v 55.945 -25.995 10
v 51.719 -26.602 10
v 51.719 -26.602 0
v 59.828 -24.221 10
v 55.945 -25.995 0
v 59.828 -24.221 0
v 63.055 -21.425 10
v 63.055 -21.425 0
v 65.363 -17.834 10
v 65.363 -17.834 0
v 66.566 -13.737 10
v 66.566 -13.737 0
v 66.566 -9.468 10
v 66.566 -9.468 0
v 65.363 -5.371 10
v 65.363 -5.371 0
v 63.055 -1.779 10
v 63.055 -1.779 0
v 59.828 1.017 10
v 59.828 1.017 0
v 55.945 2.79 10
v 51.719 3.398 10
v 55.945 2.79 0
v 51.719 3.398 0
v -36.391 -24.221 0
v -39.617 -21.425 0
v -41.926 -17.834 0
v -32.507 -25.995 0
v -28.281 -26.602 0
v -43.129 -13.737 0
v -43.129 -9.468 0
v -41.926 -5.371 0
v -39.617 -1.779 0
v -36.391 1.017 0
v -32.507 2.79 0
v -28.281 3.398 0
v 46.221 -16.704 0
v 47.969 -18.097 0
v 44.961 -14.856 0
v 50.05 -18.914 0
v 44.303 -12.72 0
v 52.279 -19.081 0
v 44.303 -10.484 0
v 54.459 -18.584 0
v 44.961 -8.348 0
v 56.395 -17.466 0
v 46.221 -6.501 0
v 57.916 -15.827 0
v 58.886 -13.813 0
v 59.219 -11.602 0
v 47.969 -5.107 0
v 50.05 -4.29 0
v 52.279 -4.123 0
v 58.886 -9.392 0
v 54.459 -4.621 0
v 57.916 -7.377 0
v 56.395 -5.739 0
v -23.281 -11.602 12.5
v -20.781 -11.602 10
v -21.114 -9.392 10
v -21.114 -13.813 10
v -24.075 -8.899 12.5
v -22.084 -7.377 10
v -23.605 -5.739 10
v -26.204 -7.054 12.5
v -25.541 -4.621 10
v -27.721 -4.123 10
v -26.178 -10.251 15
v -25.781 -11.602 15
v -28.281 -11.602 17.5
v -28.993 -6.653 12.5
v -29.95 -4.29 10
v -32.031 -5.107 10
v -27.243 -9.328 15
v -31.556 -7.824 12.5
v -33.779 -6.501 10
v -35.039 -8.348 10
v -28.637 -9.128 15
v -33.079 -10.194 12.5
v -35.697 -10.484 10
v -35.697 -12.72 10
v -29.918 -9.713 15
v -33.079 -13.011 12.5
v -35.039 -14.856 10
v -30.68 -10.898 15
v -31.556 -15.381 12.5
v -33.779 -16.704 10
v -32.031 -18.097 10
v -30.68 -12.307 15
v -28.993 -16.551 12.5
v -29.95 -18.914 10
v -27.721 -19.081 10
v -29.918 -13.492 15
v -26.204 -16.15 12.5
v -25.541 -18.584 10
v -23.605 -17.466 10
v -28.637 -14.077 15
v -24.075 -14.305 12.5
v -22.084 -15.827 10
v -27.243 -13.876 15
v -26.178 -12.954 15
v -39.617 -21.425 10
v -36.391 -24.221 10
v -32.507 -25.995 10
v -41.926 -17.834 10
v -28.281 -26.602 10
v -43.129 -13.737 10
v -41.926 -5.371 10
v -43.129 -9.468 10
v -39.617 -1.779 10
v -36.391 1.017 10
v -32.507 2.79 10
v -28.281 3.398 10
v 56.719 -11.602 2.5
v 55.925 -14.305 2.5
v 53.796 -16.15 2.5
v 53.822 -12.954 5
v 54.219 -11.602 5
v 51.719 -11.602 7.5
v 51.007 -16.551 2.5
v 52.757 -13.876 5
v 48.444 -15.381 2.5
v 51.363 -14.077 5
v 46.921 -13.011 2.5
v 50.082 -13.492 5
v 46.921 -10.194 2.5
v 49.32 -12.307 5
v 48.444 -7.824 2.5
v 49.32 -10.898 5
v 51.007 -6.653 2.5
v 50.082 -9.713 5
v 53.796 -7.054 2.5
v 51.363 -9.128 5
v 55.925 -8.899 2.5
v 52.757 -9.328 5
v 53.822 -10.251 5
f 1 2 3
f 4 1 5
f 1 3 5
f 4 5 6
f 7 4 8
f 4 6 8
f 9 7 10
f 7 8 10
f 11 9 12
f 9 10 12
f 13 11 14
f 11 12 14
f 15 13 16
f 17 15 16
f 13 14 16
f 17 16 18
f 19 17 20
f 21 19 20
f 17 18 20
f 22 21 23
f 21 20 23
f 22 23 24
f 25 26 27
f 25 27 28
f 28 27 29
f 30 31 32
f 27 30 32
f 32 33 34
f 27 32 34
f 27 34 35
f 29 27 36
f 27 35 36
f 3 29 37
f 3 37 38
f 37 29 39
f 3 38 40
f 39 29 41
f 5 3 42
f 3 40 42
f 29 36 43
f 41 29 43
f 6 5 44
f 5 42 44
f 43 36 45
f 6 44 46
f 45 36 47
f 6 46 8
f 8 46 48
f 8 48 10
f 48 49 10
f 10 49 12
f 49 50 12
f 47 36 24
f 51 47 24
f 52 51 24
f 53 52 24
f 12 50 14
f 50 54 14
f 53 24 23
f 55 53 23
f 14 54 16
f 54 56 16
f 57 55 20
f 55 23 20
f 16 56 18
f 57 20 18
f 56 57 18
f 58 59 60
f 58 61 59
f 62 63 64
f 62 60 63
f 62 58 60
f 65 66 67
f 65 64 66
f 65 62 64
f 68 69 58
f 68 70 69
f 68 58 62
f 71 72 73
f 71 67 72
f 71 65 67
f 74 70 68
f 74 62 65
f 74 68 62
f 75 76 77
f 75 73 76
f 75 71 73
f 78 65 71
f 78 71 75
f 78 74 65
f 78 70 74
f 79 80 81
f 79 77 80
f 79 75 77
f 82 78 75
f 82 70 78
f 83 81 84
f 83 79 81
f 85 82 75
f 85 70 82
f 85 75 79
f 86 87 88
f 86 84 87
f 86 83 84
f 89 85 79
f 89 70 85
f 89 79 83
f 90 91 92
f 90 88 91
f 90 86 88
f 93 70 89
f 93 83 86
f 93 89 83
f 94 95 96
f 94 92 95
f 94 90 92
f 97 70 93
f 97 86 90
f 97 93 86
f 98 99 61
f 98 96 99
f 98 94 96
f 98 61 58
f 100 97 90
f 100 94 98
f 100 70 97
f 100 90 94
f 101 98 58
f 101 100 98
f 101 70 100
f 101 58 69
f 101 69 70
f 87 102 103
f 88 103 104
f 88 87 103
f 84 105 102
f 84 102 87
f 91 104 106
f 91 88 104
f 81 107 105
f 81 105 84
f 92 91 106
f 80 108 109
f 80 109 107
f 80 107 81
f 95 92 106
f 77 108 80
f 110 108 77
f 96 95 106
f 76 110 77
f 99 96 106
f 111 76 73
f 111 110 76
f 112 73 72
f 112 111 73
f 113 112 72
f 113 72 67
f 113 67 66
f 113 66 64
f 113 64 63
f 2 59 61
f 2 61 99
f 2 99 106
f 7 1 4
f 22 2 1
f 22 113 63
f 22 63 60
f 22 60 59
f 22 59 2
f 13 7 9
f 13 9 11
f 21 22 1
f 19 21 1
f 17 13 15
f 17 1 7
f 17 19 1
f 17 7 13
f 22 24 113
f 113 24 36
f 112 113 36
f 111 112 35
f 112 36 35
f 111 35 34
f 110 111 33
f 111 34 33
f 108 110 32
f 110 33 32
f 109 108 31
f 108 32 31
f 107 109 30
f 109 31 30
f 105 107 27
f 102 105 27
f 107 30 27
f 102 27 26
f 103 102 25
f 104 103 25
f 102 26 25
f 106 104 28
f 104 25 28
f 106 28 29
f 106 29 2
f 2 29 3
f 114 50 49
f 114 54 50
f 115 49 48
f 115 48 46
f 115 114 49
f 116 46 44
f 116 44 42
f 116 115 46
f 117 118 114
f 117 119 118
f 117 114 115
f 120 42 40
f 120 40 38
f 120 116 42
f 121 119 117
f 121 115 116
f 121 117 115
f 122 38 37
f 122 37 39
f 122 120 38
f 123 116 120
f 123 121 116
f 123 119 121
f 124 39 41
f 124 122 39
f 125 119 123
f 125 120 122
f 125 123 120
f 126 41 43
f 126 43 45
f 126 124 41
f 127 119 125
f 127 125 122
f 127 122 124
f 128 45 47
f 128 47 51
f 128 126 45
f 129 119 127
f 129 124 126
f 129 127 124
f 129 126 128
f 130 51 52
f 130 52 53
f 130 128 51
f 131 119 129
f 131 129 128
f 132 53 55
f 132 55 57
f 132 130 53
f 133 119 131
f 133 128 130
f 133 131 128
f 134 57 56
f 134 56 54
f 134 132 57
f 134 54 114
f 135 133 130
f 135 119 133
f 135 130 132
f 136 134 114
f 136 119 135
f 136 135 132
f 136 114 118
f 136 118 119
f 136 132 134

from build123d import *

# Parameters (mm, degrees)
F1_DEPTH = 10
F2_R     = 7.5
F3_DEPTH = 7.5
F3_TAPER = 45
F4_R     = 7.5


# Not quite as in the source:
# - an extrude whose draft closes it to a point is written as a loft to that point


with BuildPart() as f1:
    # F0 (on Top) → F1 (new body)
    with BuildSketch(Plane.XY):
        with BuildLine():
            Line((51.71875, 3.3977172854), (-28.28125, 3.3977172854))
            ThreePointArc((-28.28125, 3.3977172854), (-43.28125, -11.6022827146), (-28.28125, -26.6022827146))
            Line((-28.28125, -26.6022827146), (51.71875, -26.6022827146))
            ThreePointArc((51.71875, -26.6022827146), (66.71875, -11.6022827146), (51.71875, 3.3977172854))
        make_face()
    extrude(amount=F1_DEPTH)

    # F2 (on face) → F3 (join)
    with BuildSketch(Plane.XY.offset(10)):
        with Locations((-28.28125, -11.6022827146)):
            Circle(F2_R)
    extrude(amount=F3_DEPTH, taper=F3_TAPER)

    # F4 (on face) → F5 section 0
    with BuildSketch(Plane(origin=(0, 0, 0), x_dir=(1, 0, 0), z_dir=(0, 0, -1)), mode=Mode.PRIVATE) as f5_s0:
        with Locations((51.71875, 11.6022827146)):
            Circle(F4_R)
    loft([f5_s0.sketch, Vertex(51.71875, -11.6022827146, 7.5)], ruled=True, mode=Mode.SUBTRACT)


solid = f1.part
